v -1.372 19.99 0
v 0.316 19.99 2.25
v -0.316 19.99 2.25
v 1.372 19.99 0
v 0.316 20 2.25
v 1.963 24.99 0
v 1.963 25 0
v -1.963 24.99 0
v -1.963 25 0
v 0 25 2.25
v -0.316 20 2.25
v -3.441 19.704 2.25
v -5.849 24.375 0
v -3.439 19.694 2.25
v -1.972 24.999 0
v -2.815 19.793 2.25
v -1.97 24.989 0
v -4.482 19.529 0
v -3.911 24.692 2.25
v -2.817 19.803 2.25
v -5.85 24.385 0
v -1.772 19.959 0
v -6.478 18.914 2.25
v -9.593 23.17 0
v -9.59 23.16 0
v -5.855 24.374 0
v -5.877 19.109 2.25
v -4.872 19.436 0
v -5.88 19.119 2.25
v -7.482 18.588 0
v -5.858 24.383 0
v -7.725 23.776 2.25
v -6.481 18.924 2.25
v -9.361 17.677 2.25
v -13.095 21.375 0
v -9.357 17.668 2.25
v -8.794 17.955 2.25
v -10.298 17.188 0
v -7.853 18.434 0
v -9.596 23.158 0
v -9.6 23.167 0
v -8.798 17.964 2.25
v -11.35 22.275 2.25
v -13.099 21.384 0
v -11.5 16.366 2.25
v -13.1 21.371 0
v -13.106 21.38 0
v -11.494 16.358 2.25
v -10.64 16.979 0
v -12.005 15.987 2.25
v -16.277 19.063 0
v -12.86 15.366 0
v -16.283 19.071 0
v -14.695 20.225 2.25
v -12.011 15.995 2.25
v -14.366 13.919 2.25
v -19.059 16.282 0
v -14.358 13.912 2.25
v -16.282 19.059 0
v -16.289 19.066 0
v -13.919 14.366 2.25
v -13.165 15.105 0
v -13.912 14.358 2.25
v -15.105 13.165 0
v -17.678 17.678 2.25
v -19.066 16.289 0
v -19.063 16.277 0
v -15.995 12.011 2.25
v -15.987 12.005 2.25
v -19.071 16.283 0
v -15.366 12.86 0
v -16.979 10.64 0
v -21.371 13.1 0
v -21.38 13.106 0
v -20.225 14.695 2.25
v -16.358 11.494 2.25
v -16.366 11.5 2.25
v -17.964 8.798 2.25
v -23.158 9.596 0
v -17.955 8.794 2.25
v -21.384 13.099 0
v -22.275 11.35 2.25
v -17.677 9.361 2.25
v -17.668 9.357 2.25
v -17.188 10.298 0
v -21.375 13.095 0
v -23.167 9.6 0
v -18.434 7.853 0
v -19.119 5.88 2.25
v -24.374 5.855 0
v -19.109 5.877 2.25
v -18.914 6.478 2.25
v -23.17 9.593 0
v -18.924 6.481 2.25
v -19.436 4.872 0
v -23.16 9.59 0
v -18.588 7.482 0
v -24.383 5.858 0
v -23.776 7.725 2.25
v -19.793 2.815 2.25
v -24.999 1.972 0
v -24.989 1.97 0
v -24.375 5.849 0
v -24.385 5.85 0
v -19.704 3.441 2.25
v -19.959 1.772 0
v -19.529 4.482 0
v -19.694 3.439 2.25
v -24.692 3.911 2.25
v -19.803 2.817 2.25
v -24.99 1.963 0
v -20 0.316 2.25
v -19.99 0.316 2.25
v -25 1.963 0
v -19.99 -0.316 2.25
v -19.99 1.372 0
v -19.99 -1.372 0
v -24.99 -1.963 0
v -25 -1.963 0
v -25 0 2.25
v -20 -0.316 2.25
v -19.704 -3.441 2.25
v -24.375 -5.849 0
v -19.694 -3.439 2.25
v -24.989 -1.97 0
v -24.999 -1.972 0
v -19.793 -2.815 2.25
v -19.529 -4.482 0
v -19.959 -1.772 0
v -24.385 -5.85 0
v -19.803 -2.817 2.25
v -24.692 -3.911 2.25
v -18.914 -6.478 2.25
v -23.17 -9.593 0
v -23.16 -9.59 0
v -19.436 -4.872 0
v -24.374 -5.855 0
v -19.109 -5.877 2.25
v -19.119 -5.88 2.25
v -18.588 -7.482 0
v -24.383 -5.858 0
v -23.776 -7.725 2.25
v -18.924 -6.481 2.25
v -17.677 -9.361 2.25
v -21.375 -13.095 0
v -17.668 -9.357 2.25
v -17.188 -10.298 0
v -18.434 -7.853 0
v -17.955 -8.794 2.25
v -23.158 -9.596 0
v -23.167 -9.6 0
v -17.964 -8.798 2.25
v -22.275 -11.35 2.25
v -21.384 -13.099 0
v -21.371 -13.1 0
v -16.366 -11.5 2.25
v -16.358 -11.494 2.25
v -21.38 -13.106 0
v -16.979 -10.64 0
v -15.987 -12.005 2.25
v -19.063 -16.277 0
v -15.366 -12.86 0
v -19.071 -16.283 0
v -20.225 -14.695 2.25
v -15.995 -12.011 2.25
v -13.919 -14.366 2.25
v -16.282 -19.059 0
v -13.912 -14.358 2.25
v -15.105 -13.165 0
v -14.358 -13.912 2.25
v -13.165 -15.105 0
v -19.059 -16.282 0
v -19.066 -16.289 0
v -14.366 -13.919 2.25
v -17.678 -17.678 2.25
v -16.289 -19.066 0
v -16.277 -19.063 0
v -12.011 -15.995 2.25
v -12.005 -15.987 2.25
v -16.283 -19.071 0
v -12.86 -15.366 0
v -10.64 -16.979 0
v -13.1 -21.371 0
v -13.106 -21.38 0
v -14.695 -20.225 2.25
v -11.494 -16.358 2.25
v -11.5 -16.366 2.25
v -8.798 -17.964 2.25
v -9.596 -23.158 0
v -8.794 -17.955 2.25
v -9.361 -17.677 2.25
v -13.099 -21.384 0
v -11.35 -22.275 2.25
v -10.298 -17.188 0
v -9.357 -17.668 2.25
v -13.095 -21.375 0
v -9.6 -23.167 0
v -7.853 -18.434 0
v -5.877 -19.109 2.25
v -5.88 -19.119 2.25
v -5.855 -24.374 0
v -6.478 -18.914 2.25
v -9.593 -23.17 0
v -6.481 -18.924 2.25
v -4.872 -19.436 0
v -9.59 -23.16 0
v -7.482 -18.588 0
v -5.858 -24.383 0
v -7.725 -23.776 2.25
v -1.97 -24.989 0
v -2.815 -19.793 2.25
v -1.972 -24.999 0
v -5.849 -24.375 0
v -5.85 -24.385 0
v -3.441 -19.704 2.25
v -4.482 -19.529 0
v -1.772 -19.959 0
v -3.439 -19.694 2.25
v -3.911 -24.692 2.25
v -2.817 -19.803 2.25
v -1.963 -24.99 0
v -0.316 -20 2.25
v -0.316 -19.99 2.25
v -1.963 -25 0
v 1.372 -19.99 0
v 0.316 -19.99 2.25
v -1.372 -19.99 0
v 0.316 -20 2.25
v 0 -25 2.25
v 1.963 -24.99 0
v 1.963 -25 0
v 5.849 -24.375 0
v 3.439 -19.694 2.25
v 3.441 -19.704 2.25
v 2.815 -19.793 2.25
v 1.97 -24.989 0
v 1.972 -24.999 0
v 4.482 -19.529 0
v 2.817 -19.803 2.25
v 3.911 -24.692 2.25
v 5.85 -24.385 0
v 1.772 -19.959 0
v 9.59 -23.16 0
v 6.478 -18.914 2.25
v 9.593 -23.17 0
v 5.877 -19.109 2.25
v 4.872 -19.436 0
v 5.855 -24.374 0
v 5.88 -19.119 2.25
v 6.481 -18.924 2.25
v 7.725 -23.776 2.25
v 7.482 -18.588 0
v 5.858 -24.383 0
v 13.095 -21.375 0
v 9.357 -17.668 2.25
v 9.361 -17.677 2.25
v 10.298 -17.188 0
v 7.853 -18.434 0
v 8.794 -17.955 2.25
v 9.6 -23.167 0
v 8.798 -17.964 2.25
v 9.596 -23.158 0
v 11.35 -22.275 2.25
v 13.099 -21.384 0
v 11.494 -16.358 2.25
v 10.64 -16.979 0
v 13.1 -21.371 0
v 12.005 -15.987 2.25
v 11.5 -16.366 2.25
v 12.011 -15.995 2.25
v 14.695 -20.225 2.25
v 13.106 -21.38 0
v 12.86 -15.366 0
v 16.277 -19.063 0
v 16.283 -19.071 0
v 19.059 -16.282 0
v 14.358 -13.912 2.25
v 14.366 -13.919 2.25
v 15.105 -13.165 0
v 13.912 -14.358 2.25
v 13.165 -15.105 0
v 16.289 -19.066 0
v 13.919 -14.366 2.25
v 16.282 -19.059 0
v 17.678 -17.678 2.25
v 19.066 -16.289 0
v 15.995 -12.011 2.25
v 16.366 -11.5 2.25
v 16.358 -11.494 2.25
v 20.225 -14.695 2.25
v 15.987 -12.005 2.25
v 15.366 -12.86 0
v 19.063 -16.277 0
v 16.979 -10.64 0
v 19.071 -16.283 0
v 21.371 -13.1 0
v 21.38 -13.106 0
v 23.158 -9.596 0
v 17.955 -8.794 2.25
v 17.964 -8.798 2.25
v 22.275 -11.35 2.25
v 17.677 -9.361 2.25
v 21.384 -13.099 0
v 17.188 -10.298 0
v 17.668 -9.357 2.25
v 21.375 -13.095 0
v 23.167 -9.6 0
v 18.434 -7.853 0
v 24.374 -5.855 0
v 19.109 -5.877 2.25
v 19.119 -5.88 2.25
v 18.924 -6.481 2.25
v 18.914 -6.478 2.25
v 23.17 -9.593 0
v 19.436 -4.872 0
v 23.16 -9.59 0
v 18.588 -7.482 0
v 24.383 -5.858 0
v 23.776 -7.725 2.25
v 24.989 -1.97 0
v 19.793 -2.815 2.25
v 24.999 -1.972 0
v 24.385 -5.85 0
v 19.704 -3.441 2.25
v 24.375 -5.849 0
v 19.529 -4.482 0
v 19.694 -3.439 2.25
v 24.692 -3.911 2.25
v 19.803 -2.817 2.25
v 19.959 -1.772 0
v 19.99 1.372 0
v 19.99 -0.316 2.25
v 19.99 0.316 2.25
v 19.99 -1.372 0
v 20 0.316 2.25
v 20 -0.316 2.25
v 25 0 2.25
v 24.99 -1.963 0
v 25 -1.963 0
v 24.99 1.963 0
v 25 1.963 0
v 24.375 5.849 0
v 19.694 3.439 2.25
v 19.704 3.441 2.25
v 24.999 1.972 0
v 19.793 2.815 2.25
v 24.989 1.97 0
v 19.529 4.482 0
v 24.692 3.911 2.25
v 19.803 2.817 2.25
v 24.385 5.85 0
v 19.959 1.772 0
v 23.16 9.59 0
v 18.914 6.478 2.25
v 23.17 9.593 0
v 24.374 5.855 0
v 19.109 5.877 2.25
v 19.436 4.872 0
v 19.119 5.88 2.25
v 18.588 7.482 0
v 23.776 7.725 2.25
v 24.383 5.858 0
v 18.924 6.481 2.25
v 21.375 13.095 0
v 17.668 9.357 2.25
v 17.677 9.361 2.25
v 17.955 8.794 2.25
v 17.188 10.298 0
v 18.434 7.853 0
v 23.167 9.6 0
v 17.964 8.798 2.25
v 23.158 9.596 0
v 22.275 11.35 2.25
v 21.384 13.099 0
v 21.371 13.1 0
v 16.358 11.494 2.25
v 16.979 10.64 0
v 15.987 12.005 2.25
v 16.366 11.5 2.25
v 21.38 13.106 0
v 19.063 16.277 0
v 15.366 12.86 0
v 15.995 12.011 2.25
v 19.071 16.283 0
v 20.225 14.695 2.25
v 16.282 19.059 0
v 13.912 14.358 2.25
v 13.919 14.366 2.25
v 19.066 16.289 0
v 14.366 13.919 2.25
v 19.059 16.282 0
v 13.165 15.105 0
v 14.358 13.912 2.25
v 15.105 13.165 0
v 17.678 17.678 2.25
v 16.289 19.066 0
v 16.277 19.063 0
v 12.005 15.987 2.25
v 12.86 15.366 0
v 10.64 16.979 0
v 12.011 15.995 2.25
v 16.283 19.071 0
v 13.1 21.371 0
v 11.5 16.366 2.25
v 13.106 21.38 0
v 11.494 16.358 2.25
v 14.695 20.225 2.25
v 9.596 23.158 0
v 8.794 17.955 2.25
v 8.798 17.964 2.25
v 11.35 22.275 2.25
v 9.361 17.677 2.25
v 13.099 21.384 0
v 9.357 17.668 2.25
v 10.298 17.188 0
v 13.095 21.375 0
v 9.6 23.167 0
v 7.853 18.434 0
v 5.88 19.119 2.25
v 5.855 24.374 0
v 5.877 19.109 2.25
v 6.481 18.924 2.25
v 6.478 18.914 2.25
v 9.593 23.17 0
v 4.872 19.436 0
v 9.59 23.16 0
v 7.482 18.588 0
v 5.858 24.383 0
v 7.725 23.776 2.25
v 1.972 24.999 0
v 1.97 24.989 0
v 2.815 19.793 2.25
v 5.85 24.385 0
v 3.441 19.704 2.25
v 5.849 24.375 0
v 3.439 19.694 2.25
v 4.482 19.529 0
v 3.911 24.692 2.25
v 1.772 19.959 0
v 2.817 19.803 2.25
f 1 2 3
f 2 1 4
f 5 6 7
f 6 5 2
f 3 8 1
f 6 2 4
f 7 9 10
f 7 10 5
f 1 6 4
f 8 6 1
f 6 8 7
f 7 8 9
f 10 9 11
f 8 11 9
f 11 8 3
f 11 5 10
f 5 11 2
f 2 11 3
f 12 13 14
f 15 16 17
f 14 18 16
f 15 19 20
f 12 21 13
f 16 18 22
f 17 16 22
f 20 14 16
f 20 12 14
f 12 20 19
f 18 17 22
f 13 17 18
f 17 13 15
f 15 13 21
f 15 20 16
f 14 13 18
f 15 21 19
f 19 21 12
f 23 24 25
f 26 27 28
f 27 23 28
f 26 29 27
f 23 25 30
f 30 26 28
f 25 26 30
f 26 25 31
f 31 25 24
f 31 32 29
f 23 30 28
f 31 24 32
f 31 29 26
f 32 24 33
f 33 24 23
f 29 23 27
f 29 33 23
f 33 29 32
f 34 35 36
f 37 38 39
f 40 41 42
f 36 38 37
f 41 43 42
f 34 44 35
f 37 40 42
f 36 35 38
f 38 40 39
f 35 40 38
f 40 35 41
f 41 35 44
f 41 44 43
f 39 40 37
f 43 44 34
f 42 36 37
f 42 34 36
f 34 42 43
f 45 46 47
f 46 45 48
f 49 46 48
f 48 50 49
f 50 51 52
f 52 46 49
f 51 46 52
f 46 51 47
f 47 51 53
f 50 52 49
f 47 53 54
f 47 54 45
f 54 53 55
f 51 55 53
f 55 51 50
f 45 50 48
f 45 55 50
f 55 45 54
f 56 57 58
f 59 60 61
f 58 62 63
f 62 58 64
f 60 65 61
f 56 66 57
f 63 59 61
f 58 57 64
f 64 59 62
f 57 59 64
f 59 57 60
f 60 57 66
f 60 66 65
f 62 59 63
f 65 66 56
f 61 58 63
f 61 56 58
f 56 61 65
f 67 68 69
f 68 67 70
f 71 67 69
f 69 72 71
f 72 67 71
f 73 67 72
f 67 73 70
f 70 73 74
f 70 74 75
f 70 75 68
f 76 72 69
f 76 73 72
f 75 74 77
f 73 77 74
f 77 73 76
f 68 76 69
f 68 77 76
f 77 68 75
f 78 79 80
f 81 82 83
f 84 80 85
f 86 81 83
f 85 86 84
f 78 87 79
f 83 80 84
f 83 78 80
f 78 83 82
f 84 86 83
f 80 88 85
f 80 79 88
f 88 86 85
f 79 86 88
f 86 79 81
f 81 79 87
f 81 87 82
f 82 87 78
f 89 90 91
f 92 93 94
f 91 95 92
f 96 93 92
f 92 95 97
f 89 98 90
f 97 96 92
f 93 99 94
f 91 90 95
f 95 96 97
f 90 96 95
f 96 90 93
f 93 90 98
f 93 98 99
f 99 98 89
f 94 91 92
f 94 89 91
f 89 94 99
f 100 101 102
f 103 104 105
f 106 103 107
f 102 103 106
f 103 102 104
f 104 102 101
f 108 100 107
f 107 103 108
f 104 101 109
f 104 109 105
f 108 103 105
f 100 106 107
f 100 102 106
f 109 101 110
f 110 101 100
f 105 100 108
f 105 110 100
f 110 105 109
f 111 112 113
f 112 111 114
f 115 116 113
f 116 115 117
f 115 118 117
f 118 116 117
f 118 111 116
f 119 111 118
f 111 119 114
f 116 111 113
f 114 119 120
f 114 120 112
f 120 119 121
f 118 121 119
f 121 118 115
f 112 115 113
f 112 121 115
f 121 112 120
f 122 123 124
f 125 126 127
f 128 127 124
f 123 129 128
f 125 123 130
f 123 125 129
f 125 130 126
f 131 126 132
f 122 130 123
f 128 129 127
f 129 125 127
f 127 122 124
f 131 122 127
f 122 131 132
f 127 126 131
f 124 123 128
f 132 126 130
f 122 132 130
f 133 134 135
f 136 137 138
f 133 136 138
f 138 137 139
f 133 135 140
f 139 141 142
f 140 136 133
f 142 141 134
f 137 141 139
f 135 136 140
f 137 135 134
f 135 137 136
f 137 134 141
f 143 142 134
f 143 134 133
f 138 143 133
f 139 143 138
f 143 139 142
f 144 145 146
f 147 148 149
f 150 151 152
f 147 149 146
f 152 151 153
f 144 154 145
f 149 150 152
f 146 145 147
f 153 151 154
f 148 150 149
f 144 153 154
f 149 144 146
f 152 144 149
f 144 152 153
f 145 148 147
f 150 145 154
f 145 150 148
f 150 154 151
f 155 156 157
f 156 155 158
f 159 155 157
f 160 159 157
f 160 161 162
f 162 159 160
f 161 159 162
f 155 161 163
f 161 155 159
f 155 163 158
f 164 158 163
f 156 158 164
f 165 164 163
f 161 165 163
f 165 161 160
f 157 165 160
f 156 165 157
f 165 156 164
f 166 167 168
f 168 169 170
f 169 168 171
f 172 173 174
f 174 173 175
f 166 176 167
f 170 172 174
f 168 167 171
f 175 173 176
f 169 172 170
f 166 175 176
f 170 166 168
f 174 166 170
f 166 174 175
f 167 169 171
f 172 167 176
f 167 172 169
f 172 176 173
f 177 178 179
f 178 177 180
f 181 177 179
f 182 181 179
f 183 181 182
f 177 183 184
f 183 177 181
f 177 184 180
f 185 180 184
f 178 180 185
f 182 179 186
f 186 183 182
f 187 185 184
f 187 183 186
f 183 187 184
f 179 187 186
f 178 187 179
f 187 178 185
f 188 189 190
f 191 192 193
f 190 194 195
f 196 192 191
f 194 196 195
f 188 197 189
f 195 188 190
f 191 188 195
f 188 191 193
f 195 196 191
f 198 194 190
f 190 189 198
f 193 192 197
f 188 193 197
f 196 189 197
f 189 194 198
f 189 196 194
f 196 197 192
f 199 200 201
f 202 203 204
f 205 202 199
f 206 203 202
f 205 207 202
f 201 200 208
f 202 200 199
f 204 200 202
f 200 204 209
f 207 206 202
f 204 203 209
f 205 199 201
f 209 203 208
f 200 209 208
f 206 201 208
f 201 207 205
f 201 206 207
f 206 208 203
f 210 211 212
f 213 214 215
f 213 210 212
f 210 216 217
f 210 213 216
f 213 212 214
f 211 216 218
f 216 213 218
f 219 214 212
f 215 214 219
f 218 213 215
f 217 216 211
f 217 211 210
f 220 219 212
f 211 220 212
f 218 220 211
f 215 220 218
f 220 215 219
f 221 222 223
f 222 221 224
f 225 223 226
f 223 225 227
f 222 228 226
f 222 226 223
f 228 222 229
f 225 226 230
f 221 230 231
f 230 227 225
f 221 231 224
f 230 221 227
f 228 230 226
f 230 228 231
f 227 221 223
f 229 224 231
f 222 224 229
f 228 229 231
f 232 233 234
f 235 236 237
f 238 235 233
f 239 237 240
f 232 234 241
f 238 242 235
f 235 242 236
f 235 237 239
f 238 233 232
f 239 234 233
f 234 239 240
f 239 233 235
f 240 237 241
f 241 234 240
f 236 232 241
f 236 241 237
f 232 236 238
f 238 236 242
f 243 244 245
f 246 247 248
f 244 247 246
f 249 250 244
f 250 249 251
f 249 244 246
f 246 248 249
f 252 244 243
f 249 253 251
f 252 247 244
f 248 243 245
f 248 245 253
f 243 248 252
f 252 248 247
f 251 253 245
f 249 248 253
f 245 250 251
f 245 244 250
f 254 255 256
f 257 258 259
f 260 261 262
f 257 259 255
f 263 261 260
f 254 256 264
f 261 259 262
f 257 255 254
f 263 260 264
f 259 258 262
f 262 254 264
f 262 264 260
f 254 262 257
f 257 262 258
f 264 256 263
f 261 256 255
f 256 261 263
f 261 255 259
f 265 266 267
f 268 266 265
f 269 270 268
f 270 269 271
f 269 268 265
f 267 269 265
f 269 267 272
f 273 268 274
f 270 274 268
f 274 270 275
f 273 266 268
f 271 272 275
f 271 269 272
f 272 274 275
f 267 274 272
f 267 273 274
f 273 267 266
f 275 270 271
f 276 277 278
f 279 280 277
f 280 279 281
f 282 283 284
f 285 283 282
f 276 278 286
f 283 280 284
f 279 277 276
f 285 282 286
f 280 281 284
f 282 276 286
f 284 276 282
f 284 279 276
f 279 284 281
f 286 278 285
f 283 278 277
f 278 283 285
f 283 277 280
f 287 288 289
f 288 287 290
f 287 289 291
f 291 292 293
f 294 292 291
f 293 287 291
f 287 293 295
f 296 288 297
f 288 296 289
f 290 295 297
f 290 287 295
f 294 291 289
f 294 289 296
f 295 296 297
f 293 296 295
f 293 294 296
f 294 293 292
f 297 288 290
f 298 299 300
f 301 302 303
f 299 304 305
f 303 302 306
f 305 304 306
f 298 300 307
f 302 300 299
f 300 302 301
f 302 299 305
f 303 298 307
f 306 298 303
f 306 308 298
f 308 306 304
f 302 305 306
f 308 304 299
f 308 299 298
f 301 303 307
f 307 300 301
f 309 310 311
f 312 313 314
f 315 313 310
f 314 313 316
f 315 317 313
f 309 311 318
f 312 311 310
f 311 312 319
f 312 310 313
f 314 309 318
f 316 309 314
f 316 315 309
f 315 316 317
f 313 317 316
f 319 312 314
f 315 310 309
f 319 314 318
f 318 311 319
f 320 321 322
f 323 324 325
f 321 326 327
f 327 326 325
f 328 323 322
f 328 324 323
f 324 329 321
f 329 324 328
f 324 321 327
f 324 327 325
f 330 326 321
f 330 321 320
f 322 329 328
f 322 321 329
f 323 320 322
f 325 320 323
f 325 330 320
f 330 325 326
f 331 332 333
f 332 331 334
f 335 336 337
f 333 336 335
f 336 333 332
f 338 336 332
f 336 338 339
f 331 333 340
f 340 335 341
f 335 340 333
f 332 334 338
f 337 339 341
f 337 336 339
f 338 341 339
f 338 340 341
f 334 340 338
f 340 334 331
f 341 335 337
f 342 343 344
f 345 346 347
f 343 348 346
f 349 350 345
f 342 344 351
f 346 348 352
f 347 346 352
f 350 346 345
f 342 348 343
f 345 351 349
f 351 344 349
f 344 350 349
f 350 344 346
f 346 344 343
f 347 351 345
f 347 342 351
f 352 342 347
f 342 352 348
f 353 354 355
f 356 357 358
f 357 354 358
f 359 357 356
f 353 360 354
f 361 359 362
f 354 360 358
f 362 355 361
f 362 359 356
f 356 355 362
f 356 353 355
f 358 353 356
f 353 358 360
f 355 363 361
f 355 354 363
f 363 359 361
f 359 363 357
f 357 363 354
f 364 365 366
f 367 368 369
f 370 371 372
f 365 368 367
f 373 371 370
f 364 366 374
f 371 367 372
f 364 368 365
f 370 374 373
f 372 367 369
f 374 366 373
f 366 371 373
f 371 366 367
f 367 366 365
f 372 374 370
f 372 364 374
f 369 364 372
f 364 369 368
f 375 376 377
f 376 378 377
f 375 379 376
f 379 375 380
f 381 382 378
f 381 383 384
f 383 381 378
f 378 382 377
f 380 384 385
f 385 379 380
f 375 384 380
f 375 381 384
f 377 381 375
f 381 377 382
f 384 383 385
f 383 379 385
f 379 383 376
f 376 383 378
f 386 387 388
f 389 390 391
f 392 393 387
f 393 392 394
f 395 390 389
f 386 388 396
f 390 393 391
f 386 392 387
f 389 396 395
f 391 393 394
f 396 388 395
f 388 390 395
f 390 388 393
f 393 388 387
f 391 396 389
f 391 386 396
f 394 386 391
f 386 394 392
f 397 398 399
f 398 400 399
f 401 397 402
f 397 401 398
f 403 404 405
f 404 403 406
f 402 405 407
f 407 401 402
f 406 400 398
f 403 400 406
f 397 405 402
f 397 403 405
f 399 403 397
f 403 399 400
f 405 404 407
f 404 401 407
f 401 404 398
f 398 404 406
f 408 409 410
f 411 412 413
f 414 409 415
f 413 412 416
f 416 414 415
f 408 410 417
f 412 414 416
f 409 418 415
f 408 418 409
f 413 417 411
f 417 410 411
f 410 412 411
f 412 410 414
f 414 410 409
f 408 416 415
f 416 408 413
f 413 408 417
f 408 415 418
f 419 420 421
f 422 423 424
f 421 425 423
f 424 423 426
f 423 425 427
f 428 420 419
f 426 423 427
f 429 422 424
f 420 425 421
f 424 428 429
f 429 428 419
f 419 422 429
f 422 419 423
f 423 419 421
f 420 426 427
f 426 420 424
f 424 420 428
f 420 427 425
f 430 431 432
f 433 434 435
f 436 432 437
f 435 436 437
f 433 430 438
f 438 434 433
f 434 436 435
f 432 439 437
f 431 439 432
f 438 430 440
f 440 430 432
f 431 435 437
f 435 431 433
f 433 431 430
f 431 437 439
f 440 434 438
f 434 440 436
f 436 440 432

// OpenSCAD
module example() {
  m = 1;
  pressureAngle = 28;

  R1 = 20;
  n1 = 2 * R1 / m;
  teethLength = 5;

  faceGear(m, pressureAngle, n1, teethLength);
}
example();

module faceGear(m, pressureAngle, numberOfTeeth, teethLength, clearance = undef, backlash = 0.0) {
  innerRadius = numberOfTeeth * m / 2;
  outerRadius = innerRadius + teethLength;
  outerModule = 2 * outerRadius / numberOfTeeth;

  for (i = [0:numberOfTeeth-1]) {
    rotate(i * 360 / numberOfTeeth, [0, 0, 1])
    translate([0, innerRadius, 0])
    faceTooth(m, outerModule, pressureAngle, teethLength, clearance, backlash);
  }  
}

module faceTooth(m, outerModule, pressureAngle, toothLength, clearance = undef, backlash = 0.0) {
  hull(){
    rotate(90, [1, 0, 0])
    linear_extrude(0.01)
    innerToothProfile(m, pressureAngle, clearance, backlash);

    translate([0, toothLength, 0])
    rotate(90, [1, 0, 0])
    linear_extrude(0.01)
    outerToothProfile(m, outerModule, pressureAngle, clearance, backlash);
  }
}

module innerToothProfile(m, pressureAngle, clearance = undef, backlash = 0.0) {  
  pitch = PI * m;
  a = adendum(m);
  d = dedendum(m, clearance);
  th = a + d;
  xa = a * sin(pressureAngle);
  xd = d * sin(pressureAngle);

  polygon(
    points=[
      [-pitch * 0.25 + backlash - xd, 0],
      [-pitch * 0.25 + backlash + xa, th],
      [pitch * 0.25 - backlash - xa, th],
      [pitch * 0.25 - backlash + xd, 0]
    ]
  );
}

module outerToothProfile(m, outerModule, pressureAngle, clearance = undef, backlash = 0.0) {  
  pitch = PI * outerModule;
  a = adendum(m);
  d = dedendum(m, clearance);
  th = a + d;

  polygon(
    points=[
      [-pitch * 0.5 + backlash, 0],
      [0, th],
      [pitch * 0.5 - backlash, 0]
    ]
  );
}

function adendum(m) = m;
function dedendum(m, clearance = undef) = (clearance==undef)? (1.25 * m) : (m + clearance);
